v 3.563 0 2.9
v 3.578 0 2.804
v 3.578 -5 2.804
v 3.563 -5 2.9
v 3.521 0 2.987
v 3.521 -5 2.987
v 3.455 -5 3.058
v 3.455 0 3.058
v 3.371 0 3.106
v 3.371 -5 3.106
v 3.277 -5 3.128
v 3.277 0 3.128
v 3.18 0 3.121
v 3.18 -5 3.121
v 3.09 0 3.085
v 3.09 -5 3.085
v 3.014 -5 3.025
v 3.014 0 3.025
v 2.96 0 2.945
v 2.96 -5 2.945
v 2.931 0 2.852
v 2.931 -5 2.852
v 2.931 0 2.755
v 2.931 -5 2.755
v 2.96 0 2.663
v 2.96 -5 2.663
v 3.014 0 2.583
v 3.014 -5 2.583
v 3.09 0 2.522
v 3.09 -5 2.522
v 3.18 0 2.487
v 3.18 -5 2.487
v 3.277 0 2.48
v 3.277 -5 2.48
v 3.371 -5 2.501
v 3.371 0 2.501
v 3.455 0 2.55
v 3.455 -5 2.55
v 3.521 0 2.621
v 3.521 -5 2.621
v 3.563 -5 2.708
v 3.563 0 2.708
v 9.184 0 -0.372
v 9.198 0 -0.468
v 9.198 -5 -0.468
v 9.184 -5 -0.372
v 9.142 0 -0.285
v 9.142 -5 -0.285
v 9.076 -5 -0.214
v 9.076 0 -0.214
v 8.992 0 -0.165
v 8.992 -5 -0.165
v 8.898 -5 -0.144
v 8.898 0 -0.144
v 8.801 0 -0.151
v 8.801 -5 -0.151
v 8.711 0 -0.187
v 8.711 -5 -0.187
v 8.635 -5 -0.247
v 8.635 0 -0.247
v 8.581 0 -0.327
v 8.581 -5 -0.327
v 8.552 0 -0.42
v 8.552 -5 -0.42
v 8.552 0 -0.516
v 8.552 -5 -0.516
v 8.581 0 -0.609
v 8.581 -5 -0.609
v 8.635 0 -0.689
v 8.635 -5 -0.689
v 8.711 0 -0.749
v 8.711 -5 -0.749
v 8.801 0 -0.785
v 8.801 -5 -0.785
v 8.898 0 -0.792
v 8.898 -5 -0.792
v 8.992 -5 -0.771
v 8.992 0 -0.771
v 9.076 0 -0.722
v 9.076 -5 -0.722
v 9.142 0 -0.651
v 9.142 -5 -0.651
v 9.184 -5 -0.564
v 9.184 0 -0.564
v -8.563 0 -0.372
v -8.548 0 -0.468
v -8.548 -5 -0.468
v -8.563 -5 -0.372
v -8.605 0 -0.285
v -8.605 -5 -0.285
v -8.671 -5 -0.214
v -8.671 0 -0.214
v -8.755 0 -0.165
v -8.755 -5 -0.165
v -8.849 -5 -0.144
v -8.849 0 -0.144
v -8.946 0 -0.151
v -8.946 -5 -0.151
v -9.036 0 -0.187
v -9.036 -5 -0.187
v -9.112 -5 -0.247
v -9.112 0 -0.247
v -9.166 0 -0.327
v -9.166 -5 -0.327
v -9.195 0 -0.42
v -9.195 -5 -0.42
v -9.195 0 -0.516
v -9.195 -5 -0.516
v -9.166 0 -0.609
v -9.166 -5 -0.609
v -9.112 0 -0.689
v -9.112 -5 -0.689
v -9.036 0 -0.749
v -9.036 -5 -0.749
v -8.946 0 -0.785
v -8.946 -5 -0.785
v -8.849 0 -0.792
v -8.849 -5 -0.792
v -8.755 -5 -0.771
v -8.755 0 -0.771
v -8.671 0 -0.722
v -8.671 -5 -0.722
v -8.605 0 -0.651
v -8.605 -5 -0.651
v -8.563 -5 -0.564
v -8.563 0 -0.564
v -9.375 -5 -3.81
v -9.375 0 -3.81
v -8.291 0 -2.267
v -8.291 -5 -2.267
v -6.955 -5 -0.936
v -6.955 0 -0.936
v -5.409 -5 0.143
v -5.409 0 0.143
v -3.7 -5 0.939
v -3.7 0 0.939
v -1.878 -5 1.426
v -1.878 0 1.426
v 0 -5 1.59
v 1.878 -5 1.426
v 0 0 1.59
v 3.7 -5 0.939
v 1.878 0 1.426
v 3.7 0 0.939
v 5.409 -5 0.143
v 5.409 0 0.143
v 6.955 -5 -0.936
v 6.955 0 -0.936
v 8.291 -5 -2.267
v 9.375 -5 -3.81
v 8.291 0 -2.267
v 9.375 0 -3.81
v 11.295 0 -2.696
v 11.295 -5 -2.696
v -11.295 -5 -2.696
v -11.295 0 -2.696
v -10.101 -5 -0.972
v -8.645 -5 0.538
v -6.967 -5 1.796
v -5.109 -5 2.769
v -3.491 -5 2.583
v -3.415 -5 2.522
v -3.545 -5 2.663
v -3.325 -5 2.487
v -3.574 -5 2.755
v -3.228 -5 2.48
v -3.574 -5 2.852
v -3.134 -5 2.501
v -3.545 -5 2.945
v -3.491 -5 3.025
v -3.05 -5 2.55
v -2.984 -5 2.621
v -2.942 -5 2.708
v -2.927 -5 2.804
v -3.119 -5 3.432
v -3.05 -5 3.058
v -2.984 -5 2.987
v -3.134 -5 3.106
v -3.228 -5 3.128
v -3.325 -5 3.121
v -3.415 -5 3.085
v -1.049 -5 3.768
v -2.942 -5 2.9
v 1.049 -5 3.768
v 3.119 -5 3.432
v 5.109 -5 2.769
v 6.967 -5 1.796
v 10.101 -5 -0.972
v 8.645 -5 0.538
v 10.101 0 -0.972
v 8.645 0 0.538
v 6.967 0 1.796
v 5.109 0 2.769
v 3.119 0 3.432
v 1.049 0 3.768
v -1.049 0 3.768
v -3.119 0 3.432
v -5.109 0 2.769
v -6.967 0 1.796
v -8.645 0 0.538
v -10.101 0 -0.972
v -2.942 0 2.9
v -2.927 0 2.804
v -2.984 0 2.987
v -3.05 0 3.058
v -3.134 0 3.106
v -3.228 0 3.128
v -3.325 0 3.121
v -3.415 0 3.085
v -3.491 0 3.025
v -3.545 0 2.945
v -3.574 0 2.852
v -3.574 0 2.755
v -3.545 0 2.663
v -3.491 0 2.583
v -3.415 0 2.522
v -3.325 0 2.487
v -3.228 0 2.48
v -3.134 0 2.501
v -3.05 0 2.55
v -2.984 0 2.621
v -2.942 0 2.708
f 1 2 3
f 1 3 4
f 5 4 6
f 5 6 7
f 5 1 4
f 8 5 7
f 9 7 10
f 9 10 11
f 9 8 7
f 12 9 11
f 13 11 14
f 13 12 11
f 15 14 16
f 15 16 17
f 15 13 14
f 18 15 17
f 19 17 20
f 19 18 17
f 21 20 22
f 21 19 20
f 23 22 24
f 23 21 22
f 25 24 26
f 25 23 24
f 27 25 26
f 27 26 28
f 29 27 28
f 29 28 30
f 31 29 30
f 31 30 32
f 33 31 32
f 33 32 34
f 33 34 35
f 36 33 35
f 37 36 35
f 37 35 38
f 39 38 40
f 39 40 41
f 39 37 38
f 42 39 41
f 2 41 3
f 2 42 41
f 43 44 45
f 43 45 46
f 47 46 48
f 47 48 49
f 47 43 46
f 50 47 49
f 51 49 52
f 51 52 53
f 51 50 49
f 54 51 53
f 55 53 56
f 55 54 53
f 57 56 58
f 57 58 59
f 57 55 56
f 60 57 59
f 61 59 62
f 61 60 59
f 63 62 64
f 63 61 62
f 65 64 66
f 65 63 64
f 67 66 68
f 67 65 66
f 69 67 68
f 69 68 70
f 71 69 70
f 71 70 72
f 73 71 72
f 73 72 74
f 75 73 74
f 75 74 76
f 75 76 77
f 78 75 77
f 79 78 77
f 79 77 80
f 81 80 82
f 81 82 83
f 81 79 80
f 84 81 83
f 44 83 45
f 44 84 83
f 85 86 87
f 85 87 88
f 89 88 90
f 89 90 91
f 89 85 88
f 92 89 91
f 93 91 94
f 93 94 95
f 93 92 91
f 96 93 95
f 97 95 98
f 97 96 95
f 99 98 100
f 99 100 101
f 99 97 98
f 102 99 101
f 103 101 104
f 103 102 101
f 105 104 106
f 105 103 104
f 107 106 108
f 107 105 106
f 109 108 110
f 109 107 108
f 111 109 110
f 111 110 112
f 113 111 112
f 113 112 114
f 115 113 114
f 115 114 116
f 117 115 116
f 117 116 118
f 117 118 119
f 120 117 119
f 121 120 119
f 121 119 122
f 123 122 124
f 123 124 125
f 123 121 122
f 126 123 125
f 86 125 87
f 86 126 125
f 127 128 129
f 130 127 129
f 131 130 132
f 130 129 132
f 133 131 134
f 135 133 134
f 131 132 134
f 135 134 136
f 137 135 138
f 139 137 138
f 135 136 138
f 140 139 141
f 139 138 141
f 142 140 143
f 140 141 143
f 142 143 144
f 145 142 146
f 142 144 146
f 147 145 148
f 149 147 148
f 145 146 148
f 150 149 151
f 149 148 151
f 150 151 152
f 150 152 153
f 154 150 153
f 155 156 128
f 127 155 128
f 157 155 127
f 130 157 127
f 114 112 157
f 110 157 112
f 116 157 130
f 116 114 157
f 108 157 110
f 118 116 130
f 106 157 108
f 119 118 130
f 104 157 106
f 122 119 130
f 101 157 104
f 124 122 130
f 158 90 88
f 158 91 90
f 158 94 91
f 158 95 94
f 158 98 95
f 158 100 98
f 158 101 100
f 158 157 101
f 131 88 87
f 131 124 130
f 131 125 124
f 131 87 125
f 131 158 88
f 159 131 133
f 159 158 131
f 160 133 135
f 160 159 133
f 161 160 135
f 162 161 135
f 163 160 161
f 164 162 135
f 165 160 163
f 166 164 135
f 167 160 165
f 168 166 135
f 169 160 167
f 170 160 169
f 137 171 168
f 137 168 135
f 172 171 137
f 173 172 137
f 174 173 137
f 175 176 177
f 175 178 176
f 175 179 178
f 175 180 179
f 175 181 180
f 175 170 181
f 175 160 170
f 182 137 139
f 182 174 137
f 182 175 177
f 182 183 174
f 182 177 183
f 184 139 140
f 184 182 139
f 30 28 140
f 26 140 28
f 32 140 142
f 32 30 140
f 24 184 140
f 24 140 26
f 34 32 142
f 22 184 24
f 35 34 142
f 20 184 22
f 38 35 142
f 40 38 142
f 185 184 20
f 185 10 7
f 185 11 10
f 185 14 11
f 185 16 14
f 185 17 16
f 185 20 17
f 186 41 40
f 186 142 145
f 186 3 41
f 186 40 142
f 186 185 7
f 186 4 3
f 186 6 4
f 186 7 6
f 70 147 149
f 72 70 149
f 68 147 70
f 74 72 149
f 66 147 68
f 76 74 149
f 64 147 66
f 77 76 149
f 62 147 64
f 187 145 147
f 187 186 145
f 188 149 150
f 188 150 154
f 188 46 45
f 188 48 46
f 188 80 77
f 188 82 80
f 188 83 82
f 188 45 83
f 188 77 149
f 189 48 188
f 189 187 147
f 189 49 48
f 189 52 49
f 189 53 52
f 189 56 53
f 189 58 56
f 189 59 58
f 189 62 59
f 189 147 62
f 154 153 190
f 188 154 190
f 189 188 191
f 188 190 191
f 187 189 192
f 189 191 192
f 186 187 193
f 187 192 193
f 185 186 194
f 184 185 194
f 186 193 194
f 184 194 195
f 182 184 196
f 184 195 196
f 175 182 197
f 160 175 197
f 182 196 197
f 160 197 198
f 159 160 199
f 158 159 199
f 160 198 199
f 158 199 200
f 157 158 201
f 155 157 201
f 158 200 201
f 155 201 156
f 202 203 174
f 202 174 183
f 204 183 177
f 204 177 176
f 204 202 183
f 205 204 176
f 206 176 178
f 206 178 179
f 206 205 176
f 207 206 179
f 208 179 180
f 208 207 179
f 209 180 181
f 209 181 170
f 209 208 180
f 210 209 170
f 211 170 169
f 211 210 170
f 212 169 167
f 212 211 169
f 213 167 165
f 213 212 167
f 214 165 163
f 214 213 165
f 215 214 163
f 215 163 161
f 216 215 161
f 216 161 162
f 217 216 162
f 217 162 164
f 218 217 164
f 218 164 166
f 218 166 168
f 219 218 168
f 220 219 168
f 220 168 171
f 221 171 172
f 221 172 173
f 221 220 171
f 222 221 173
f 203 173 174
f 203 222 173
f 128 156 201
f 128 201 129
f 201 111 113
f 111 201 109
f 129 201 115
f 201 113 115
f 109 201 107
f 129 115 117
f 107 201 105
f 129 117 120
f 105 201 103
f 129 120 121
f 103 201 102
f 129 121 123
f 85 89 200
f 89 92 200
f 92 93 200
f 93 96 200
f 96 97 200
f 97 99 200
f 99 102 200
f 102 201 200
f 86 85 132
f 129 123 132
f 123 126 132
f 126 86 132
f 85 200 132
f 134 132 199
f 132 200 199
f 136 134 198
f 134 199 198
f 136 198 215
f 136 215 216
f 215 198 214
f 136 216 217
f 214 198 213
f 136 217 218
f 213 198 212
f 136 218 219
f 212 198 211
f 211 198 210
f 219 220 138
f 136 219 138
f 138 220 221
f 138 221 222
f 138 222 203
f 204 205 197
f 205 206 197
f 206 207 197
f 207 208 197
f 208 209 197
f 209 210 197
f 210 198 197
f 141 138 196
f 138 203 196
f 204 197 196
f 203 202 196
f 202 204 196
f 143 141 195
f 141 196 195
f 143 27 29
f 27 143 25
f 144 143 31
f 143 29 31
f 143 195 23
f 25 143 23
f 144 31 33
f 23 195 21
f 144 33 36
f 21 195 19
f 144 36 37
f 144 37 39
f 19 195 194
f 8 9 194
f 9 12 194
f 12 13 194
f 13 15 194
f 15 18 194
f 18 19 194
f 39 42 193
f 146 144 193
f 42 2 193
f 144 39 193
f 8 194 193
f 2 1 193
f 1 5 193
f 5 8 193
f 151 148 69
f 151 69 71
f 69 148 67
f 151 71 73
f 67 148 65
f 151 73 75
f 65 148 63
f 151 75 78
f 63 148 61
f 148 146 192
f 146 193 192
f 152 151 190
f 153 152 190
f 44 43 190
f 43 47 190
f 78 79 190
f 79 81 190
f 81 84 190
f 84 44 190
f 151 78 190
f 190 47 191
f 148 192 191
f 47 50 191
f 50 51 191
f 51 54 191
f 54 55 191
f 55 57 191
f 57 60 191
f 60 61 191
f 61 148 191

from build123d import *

# Parameters (mm, degrees)
F0_R     = 0.325
F1_DEPTH = 5


# Not quite as in the source:
# - ends of sketch curves that miss each other by under 0.0002 mm in the source are joined


with BuildPart() as f1:
    # F0 (on Front) → F1 (new body)
    with BuildSketch(Plane.XZ):
        with BuildLine():
            Line((-11.295323, -2.696106), (-9.375, -3.81))
            ThreePointArc((-9.375, -3.81), (0, 1.590001), (9.3750005059, -3.8099997066))
            Line((9.3750005059, -3.8099997066), (11.295323, -2.696106))
            ThreePointArc((11.295323, -2.696106), (0, 3.810001), (-11.295323, -2.696106))
        make_face()
        with Locations((-8.873374, -0.467984)):
            Circle(F0_R, mode=Mode.SUBTRACT)
        with Locations((8.873374, -0.467984)):
            Circle(F0_R, mode=Mode.SUBTRACT)
        with Locations((-3.2525, 2.803828)):
            Circle(F0_R, mode=Mode.SUBTRACT)
        with Locations((3.2525, 2.803828)):
            Circle(F0_R, mode=Mode.SUBTRACT)
    extrude(amount=F1_DEPTH)


solid = f1.part
